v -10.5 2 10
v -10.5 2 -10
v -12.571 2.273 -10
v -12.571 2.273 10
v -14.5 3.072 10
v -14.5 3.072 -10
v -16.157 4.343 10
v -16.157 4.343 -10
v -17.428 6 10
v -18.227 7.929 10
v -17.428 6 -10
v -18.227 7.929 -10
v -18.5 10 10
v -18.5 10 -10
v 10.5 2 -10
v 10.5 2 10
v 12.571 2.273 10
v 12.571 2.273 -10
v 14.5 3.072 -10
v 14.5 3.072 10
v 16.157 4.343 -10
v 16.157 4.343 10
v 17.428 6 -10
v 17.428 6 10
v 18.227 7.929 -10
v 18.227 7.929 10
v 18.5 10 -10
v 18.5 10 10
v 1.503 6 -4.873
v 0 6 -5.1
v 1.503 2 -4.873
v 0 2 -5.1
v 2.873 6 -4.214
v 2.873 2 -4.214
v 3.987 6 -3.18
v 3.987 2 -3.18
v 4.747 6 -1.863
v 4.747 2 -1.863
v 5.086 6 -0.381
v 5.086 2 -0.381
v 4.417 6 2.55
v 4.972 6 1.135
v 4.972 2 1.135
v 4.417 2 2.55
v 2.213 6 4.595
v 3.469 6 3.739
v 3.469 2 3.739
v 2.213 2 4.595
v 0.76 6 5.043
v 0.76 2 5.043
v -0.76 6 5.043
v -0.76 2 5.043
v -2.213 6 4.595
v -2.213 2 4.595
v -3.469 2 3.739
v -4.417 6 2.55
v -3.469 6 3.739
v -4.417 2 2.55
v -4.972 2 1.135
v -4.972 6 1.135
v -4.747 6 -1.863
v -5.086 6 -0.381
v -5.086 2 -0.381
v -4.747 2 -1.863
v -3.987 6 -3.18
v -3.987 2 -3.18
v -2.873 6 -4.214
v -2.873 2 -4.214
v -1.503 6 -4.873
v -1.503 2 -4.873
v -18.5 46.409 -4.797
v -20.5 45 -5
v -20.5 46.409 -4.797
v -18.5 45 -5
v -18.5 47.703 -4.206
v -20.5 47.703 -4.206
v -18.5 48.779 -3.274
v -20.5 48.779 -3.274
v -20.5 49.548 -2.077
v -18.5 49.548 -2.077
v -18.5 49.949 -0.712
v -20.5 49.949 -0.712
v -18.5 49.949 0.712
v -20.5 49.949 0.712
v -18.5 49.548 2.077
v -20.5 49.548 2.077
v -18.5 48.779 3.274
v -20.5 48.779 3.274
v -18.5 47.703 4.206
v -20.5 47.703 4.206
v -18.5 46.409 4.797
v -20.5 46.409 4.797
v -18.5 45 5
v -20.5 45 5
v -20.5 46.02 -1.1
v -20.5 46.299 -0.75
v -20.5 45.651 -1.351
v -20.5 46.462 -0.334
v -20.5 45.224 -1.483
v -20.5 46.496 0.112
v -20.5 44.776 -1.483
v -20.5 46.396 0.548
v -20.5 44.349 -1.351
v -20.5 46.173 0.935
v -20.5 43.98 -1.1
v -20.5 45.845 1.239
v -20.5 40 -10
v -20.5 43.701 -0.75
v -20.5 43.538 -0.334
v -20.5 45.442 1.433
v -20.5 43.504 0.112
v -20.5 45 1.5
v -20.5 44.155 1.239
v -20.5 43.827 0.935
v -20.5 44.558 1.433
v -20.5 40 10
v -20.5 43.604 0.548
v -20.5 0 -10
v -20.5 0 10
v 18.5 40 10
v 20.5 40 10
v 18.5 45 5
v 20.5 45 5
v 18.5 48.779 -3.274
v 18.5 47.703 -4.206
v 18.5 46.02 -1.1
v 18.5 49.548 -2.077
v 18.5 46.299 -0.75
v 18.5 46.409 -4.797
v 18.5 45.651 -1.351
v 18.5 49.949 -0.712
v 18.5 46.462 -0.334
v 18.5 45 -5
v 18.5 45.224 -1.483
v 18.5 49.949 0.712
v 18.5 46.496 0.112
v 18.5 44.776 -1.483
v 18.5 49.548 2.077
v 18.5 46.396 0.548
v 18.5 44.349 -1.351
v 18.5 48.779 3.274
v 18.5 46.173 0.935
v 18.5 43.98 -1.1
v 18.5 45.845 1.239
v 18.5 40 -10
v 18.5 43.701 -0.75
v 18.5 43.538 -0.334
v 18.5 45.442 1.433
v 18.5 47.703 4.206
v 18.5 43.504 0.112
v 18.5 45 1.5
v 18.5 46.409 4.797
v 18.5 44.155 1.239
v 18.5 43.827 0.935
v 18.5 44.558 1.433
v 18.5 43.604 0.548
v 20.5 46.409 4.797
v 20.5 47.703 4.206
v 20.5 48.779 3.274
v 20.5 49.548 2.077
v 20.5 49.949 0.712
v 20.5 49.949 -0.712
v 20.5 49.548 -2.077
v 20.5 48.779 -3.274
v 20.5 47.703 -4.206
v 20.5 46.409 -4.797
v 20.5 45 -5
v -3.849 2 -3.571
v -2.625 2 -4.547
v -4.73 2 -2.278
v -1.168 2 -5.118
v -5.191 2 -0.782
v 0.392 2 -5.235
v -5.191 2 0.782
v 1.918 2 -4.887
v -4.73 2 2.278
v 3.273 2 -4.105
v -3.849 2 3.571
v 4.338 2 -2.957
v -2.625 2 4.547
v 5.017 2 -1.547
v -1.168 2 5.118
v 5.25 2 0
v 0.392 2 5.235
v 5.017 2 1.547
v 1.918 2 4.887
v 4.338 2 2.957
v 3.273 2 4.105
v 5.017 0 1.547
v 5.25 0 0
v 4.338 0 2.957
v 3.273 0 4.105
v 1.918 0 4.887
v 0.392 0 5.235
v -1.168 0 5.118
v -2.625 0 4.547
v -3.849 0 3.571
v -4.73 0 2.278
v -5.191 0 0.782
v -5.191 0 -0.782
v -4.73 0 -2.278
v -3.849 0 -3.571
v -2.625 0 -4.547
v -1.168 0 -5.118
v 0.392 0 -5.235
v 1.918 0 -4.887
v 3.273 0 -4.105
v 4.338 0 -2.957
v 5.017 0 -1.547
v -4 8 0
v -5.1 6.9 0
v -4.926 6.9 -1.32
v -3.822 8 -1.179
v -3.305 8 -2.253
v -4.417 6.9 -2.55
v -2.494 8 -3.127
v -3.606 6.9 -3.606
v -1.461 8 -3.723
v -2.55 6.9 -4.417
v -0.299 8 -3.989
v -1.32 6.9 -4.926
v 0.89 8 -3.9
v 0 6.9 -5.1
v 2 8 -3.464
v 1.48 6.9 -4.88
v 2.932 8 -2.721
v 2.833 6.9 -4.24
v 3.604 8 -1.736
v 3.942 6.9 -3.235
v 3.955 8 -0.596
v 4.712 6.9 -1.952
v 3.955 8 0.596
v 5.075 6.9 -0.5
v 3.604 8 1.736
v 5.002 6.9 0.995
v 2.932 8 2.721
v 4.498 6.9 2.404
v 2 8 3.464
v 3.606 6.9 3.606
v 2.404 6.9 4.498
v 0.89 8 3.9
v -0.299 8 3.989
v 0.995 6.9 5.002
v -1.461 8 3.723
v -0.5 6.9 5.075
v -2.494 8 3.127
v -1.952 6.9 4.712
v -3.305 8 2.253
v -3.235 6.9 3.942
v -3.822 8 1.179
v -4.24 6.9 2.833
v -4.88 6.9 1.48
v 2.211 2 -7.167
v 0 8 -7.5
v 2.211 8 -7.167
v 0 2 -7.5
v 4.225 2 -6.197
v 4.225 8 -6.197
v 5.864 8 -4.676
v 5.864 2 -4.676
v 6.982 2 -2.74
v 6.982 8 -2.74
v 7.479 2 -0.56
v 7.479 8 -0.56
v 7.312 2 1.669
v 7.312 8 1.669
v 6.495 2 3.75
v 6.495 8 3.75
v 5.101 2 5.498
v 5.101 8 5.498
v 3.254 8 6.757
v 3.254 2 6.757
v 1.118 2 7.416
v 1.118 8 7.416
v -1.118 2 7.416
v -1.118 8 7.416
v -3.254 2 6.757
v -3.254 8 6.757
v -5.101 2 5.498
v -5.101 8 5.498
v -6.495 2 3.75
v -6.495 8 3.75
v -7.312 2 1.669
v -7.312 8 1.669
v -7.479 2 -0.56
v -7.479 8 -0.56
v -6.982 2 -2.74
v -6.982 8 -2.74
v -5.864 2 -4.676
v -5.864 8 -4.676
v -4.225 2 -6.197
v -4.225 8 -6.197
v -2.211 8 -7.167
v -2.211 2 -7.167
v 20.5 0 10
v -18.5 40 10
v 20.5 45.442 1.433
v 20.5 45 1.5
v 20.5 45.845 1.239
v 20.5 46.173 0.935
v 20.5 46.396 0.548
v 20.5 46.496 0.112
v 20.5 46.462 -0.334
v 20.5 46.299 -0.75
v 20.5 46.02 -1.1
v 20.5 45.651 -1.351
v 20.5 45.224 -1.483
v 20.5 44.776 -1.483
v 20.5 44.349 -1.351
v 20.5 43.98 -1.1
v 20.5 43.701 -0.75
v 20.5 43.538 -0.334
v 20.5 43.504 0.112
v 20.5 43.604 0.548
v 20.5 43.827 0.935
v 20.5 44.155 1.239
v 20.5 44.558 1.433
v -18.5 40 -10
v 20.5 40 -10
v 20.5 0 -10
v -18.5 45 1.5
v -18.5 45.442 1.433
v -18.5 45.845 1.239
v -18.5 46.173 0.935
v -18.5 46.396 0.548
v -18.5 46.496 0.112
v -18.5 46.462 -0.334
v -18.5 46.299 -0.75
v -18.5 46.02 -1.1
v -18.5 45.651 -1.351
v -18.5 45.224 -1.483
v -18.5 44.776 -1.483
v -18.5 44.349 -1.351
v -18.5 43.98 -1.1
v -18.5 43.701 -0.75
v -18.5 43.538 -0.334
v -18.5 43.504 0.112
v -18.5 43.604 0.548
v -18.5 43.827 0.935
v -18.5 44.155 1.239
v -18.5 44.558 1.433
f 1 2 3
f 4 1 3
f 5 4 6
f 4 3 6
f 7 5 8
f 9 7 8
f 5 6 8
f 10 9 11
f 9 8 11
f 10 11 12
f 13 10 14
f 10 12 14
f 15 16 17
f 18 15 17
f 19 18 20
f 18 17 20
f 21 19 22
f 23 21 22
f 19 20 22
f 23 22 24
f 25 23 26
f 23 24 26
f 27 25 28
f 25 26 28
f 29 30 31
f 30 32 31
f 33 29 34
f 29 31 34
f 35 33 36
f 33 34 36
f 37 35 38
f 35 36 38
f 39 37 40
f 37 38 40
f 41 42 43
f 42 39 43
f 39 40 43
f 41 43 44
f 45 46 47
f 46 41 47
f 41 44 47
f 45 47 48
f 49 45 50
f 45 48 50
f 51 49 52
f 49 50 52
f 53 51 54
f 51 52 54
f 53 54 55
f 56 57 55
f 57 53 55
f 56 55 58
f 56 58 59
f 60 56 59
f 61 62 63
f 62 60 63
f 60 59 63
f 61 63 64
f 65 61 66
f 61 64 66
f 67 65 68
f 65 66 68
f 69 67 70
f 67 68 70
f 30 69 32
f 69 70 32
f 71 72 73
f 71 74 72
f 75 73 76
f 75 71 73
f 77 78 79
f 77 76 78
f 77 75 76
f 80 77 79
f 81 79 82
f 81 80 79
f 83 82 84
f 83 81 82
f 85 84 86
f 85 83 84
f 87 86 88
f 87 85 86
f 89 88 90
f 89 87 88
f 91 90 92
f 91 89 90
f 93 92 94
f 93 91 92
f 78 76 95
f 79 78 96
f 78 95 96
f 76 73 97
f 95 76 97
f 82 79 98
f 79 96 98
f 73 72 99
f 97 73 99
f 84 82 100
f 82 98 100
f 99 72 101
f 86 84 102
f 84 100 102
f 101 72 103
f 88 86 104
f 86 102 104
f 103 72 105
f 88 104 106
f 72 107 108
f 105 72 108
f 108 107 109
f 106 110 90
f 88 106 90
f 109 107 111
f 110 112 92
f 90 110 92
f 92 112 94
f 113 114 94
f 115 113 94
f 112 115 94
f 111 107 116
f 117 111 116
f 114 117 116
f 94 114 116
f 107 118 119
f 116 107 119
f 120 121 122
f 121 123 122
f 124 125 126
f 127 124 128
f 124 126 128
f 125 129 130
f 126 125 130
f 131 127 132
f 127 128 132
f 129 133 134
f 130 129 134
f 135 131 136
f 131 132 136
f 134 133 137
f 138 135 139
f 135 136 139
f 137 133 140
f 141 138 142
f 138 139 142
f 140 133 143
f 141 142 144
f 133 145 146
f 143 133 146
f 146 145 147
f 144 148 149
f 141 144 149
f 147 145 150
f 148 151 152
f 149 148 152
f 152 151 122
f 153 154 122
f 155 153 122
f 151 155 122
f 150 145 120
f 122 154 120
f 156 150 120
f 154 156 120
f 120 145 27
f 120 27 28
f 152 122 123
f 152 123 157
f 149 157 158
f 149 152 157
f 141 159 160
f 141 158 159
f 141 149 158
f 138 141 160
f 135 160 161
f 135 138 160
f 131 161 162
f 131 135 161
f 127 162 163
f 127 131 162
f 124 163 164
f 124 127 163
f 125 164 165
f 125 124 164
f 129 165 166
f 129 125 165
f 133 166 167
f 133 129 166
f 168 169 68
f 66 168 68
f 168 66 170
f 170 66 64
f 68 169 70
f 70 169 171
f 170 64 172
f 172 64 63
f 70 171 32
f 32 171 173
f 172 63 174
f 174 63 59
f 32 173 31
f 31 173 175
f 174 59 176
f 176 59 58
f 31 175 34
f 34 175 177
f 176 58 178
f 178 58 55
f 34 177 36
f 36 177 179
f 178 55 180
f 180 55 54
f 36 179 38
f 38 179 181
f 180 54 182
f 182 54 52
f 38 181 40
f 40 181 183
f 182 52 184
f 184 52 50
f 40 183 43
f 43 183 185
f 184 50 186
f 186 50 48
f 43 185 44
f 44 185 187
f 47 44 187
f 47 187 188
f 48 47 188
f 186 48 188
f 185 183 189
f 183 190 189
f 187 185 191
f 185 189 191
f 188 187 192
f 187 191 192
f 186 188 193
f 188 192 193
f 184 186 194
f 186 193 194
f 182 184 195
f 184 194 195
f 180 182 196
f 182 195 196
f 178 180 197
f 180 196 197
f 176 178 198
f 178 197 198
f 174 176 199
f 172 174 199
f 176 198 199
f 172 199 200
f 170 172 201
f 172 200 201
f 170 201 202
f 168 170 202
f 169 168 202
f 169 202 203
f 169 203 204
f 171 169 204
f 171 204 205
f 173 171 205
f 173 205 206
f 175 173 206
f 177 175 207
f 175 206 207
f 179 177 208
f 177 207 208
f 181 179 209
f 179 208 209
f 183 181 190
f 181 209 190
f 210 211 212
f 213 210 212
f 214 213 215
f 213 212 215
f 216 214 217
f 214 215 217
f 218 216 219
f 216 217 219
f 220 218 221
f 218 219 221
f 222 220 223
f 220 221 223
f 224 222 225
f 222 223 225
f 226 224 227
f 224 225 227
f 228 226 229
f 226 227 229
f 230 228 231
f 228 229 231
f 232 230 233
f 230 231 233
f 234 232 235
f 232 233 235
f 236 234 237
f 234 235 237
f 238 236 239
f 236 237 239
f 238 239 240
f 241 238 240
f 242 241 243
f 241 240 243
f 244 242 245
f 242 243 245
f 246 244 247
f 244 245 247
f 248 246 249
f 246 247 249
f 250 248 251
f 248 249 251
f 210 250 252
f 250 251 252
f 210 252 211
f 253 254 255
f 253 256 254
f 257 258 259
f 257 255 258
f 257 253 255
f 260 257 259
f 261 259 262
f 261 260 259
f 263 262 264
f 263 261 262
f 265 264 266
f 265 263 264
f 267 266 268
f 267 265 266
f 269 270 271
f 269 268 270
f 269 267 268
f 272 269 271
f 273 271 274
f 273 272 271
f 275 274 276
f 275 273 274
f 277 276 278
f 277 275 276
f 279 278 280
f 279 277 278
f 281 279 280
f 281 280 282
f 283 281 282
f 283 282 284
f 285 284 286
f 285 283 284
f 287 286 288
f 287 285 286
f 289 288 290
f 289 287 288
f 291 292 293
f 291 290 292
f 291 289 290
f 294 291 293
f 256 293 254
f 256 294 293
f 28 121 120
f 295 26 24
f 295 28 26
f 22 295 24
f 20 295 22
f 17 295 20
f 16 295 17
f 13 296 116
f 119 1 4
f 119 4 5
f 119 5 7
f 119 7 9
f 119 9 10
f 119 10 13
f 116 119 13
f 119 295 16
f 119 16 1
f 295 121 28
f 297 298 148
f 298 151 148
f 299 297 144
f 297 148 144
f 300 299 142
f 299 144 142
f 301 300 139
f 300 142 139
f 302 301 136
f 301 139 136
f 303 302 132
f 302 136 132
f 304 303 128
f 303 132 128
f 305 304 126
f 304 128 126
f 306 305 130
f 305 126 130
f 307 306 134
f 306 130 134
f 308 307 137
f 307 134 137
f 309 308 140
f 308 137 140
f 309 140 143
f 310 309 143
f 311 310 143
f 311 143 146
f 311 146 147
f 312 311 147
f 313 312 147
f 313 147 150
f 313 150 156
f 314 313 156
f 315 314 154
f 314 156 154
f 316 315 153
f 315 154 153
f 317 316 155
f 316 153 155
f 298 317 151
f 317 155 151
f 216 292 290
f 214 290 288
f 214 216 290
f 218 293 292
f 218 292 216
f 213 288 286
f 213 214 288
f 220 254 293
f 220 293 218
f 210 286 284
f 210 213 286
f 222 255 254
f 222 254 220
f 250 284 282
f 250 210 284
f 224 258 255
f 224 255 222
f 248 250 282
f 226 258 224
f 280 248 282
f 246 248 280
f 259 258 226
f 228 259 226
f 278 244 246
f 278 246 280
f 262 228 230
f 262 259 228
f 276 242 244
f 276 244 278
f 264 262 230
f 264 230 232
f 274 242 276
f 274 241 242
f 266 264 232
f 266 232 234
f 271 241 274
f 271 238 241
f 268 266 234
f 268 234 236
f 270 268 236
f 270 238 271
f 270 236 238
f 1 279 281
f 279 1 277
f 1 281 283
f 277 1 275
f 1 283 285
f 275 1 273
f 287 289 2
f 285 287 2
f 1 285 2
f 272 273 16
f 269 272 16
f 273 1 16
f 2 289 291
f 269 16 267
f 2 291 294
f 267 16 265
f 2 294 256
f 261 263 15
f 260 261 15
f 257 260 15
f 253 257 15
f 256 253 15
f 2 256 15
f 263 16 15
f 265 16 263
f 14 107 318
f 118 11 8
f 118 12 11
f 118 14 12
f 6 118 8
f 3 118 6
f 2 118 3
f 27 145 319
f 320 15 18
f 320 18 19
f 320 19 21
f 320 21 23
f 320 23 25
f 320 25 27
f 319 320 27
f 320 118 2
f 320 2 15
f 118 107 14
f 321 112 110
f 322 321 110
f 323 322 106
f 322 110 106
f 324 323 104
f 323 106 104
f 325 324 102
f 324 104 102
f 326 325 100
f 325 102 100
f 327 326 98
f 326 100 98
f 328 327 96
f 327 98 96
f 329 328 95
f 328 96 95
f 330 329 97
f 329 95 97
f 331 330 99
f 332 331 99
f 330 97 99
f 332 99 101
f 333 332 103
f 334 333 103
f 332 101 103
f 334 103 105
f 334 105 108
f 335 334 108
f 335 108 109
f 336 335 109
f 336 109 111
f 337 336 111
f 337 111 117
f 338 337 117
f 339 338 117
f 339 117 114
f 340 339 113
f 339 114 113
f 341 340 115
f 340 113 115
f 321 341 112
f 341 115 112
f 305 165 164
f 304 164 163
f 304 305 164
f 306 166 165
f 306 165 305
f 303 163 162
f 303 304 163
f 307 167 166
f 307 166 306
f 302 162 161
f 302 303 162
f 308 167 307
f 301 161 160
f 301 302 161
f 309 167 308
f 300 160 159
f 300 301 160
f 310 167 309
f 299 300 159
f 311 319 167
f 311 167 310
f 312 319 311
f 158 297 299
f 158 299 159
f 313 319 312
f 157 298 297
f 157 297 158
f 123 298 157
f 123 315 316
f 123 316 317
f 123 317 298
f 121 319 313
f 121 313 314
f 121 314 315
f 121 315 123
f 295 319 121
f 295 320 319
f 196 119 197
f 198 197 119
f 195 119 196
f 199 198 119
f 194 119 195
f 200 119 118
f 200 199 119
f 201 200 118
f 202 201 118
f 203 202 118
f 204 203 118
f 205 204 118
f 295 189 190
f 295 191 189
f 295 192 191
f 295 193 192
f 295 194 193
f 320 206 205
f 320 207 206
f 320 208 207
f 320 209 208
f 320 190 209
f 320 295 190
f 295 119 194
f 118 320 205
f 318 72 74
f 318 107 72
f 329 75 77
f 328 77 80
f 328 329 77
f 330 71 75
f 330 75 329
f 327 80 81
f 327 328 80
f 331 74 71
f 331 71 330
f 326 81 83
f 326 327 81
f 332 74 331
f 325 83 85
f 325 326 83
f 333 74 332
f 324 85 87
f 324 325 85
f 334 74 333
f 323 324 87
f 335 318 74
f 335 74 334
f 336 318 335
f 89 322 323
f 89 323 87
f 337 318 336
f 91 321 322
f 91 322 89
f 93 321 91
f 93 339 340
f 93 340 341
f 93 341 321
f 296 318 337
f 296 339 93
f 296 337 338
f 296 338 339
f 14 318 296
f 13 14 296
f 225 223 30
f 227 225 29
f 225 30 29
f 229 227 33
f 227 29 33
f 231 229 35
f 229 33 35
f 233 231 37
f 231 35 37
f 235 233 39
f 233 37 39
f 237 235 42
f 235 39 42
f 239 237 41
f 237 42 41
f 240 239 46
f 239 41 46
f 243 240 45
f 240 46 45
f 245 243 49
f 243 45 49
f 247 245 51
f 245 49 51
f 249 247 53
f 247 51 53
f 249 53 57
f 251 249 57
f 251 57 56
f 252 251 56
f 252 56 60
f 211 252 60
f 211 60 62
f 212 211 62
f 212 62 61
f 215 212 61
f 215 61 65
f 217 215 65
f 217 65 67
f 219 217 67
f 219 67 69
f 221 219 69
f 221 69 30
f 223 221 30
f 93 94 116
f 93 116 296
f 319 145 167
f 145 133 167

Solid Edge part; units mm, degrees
sketch "Sketch1" plane through (0, 0, 0) normal (0, -1, 0) x (1, 0, 0)
  line L0 (18.5, -10) -> (18.5, 10)
  line L1 (18.5, 10) -> (-18.5, 10)
  line L2 (-18.5, 10) -> (-18.5, -10)
  line L3 (-18.5, -10) -> (18.5, -10)
  circle A0 centre (0, 0) radius 5.25
  dimension "D1" = 10.5
  dimension "D2" = 37
  dimension "D3" = 20
extrude "Protrusion1" add sketch "Sketch1" against normal blind 2
sketch "Sketch2" plane through (-18.5, 1, 0) normal (-1, 0, 0) x (0, 0, 1)
  line L0 (10, 44) -> (10, -1)
  line L1 (10, -1) -> (-10, -1)
  line L2 (-10, -1) -> (-10, 44)
  line L3 (-10, 44) -> (10, 44)
  circle A0 centre (0, 44) radius 5
extrude "Extrusionsausprägung_2" add sketch "Sketch2" along normal blind 2
chamfer "Fase_1" distance 5 angle 45 1 edges at (-19.5, 45, 10)
chamfer "Fase_2" distance 5 angle 45 1 edges at (-19.5, 45, -10)
sketch "Sketch3" plane through (18.5, 1, 0) normal (1, 0, 0) x (0, 0, -1)
  line L0 (10, -1) -> (10, 44)
  line L1 (10, 44) -> (-10, 44)
  circle A0 centre (0, 44) radius 5
  line L2 (-10, 44) -> (-10, -1)
  line L3 (-10, -1) -> (10, -1)
extrude "Extrusionsausprägung_3" add sketch "Sketch3" along normal blind 2
sketch "Sketch4" plane through (-20.5, 17.5, 0) normal (-1, 0, 0) x (0, 0, 1)
  circle A0 centre (0, 27.5) radius 1.5
extrude "Extrusionsausschnitt_1" cut sketch "Sketch4" against normal blind 41
fillet "Verrundung_1" radius 8 1 edges at (18.5, 2, 0)
fillet "Verrundung_2" radius 8 1 edges at (-18.5, 2, 0)
chamfer "Fase_3" distance 5 angle 45 2 edges at (19.5, 45, -10) (19.5, 45, 10)
sketch "Sketch5" plane through (-0.5, 2, 0) normal (0, 1, 0) x (0, 0, -1)
  circle A0 centre (0, -0.5) radius 7.5
extrude "Extrusionsausprägung_4" add sketch "Sketch5" along normal blind 6
sketch "Sketch6" plane through (-0.5, 2, 0) normal (0, 1, 0) x (0, 0, -1)
  circle A0 centre (0, -0.5) radius 5.1
extrude "Extrusionsausschnitt_2" cut sketch "Sketch6" along normal blind 4
sketch "Sketch7" plane through (0, 8, 0) normal (0, 1, 0) x (-1, 0, 0)
  circle A0 centre (0, 0) radius 4
extrude "Extrusionsausschnitt_3" cut sketch "Sketch7" against normal blind 2
chamfer "Fase_4" distance 2 angle 45 1 edges at (4, 6, 0)
